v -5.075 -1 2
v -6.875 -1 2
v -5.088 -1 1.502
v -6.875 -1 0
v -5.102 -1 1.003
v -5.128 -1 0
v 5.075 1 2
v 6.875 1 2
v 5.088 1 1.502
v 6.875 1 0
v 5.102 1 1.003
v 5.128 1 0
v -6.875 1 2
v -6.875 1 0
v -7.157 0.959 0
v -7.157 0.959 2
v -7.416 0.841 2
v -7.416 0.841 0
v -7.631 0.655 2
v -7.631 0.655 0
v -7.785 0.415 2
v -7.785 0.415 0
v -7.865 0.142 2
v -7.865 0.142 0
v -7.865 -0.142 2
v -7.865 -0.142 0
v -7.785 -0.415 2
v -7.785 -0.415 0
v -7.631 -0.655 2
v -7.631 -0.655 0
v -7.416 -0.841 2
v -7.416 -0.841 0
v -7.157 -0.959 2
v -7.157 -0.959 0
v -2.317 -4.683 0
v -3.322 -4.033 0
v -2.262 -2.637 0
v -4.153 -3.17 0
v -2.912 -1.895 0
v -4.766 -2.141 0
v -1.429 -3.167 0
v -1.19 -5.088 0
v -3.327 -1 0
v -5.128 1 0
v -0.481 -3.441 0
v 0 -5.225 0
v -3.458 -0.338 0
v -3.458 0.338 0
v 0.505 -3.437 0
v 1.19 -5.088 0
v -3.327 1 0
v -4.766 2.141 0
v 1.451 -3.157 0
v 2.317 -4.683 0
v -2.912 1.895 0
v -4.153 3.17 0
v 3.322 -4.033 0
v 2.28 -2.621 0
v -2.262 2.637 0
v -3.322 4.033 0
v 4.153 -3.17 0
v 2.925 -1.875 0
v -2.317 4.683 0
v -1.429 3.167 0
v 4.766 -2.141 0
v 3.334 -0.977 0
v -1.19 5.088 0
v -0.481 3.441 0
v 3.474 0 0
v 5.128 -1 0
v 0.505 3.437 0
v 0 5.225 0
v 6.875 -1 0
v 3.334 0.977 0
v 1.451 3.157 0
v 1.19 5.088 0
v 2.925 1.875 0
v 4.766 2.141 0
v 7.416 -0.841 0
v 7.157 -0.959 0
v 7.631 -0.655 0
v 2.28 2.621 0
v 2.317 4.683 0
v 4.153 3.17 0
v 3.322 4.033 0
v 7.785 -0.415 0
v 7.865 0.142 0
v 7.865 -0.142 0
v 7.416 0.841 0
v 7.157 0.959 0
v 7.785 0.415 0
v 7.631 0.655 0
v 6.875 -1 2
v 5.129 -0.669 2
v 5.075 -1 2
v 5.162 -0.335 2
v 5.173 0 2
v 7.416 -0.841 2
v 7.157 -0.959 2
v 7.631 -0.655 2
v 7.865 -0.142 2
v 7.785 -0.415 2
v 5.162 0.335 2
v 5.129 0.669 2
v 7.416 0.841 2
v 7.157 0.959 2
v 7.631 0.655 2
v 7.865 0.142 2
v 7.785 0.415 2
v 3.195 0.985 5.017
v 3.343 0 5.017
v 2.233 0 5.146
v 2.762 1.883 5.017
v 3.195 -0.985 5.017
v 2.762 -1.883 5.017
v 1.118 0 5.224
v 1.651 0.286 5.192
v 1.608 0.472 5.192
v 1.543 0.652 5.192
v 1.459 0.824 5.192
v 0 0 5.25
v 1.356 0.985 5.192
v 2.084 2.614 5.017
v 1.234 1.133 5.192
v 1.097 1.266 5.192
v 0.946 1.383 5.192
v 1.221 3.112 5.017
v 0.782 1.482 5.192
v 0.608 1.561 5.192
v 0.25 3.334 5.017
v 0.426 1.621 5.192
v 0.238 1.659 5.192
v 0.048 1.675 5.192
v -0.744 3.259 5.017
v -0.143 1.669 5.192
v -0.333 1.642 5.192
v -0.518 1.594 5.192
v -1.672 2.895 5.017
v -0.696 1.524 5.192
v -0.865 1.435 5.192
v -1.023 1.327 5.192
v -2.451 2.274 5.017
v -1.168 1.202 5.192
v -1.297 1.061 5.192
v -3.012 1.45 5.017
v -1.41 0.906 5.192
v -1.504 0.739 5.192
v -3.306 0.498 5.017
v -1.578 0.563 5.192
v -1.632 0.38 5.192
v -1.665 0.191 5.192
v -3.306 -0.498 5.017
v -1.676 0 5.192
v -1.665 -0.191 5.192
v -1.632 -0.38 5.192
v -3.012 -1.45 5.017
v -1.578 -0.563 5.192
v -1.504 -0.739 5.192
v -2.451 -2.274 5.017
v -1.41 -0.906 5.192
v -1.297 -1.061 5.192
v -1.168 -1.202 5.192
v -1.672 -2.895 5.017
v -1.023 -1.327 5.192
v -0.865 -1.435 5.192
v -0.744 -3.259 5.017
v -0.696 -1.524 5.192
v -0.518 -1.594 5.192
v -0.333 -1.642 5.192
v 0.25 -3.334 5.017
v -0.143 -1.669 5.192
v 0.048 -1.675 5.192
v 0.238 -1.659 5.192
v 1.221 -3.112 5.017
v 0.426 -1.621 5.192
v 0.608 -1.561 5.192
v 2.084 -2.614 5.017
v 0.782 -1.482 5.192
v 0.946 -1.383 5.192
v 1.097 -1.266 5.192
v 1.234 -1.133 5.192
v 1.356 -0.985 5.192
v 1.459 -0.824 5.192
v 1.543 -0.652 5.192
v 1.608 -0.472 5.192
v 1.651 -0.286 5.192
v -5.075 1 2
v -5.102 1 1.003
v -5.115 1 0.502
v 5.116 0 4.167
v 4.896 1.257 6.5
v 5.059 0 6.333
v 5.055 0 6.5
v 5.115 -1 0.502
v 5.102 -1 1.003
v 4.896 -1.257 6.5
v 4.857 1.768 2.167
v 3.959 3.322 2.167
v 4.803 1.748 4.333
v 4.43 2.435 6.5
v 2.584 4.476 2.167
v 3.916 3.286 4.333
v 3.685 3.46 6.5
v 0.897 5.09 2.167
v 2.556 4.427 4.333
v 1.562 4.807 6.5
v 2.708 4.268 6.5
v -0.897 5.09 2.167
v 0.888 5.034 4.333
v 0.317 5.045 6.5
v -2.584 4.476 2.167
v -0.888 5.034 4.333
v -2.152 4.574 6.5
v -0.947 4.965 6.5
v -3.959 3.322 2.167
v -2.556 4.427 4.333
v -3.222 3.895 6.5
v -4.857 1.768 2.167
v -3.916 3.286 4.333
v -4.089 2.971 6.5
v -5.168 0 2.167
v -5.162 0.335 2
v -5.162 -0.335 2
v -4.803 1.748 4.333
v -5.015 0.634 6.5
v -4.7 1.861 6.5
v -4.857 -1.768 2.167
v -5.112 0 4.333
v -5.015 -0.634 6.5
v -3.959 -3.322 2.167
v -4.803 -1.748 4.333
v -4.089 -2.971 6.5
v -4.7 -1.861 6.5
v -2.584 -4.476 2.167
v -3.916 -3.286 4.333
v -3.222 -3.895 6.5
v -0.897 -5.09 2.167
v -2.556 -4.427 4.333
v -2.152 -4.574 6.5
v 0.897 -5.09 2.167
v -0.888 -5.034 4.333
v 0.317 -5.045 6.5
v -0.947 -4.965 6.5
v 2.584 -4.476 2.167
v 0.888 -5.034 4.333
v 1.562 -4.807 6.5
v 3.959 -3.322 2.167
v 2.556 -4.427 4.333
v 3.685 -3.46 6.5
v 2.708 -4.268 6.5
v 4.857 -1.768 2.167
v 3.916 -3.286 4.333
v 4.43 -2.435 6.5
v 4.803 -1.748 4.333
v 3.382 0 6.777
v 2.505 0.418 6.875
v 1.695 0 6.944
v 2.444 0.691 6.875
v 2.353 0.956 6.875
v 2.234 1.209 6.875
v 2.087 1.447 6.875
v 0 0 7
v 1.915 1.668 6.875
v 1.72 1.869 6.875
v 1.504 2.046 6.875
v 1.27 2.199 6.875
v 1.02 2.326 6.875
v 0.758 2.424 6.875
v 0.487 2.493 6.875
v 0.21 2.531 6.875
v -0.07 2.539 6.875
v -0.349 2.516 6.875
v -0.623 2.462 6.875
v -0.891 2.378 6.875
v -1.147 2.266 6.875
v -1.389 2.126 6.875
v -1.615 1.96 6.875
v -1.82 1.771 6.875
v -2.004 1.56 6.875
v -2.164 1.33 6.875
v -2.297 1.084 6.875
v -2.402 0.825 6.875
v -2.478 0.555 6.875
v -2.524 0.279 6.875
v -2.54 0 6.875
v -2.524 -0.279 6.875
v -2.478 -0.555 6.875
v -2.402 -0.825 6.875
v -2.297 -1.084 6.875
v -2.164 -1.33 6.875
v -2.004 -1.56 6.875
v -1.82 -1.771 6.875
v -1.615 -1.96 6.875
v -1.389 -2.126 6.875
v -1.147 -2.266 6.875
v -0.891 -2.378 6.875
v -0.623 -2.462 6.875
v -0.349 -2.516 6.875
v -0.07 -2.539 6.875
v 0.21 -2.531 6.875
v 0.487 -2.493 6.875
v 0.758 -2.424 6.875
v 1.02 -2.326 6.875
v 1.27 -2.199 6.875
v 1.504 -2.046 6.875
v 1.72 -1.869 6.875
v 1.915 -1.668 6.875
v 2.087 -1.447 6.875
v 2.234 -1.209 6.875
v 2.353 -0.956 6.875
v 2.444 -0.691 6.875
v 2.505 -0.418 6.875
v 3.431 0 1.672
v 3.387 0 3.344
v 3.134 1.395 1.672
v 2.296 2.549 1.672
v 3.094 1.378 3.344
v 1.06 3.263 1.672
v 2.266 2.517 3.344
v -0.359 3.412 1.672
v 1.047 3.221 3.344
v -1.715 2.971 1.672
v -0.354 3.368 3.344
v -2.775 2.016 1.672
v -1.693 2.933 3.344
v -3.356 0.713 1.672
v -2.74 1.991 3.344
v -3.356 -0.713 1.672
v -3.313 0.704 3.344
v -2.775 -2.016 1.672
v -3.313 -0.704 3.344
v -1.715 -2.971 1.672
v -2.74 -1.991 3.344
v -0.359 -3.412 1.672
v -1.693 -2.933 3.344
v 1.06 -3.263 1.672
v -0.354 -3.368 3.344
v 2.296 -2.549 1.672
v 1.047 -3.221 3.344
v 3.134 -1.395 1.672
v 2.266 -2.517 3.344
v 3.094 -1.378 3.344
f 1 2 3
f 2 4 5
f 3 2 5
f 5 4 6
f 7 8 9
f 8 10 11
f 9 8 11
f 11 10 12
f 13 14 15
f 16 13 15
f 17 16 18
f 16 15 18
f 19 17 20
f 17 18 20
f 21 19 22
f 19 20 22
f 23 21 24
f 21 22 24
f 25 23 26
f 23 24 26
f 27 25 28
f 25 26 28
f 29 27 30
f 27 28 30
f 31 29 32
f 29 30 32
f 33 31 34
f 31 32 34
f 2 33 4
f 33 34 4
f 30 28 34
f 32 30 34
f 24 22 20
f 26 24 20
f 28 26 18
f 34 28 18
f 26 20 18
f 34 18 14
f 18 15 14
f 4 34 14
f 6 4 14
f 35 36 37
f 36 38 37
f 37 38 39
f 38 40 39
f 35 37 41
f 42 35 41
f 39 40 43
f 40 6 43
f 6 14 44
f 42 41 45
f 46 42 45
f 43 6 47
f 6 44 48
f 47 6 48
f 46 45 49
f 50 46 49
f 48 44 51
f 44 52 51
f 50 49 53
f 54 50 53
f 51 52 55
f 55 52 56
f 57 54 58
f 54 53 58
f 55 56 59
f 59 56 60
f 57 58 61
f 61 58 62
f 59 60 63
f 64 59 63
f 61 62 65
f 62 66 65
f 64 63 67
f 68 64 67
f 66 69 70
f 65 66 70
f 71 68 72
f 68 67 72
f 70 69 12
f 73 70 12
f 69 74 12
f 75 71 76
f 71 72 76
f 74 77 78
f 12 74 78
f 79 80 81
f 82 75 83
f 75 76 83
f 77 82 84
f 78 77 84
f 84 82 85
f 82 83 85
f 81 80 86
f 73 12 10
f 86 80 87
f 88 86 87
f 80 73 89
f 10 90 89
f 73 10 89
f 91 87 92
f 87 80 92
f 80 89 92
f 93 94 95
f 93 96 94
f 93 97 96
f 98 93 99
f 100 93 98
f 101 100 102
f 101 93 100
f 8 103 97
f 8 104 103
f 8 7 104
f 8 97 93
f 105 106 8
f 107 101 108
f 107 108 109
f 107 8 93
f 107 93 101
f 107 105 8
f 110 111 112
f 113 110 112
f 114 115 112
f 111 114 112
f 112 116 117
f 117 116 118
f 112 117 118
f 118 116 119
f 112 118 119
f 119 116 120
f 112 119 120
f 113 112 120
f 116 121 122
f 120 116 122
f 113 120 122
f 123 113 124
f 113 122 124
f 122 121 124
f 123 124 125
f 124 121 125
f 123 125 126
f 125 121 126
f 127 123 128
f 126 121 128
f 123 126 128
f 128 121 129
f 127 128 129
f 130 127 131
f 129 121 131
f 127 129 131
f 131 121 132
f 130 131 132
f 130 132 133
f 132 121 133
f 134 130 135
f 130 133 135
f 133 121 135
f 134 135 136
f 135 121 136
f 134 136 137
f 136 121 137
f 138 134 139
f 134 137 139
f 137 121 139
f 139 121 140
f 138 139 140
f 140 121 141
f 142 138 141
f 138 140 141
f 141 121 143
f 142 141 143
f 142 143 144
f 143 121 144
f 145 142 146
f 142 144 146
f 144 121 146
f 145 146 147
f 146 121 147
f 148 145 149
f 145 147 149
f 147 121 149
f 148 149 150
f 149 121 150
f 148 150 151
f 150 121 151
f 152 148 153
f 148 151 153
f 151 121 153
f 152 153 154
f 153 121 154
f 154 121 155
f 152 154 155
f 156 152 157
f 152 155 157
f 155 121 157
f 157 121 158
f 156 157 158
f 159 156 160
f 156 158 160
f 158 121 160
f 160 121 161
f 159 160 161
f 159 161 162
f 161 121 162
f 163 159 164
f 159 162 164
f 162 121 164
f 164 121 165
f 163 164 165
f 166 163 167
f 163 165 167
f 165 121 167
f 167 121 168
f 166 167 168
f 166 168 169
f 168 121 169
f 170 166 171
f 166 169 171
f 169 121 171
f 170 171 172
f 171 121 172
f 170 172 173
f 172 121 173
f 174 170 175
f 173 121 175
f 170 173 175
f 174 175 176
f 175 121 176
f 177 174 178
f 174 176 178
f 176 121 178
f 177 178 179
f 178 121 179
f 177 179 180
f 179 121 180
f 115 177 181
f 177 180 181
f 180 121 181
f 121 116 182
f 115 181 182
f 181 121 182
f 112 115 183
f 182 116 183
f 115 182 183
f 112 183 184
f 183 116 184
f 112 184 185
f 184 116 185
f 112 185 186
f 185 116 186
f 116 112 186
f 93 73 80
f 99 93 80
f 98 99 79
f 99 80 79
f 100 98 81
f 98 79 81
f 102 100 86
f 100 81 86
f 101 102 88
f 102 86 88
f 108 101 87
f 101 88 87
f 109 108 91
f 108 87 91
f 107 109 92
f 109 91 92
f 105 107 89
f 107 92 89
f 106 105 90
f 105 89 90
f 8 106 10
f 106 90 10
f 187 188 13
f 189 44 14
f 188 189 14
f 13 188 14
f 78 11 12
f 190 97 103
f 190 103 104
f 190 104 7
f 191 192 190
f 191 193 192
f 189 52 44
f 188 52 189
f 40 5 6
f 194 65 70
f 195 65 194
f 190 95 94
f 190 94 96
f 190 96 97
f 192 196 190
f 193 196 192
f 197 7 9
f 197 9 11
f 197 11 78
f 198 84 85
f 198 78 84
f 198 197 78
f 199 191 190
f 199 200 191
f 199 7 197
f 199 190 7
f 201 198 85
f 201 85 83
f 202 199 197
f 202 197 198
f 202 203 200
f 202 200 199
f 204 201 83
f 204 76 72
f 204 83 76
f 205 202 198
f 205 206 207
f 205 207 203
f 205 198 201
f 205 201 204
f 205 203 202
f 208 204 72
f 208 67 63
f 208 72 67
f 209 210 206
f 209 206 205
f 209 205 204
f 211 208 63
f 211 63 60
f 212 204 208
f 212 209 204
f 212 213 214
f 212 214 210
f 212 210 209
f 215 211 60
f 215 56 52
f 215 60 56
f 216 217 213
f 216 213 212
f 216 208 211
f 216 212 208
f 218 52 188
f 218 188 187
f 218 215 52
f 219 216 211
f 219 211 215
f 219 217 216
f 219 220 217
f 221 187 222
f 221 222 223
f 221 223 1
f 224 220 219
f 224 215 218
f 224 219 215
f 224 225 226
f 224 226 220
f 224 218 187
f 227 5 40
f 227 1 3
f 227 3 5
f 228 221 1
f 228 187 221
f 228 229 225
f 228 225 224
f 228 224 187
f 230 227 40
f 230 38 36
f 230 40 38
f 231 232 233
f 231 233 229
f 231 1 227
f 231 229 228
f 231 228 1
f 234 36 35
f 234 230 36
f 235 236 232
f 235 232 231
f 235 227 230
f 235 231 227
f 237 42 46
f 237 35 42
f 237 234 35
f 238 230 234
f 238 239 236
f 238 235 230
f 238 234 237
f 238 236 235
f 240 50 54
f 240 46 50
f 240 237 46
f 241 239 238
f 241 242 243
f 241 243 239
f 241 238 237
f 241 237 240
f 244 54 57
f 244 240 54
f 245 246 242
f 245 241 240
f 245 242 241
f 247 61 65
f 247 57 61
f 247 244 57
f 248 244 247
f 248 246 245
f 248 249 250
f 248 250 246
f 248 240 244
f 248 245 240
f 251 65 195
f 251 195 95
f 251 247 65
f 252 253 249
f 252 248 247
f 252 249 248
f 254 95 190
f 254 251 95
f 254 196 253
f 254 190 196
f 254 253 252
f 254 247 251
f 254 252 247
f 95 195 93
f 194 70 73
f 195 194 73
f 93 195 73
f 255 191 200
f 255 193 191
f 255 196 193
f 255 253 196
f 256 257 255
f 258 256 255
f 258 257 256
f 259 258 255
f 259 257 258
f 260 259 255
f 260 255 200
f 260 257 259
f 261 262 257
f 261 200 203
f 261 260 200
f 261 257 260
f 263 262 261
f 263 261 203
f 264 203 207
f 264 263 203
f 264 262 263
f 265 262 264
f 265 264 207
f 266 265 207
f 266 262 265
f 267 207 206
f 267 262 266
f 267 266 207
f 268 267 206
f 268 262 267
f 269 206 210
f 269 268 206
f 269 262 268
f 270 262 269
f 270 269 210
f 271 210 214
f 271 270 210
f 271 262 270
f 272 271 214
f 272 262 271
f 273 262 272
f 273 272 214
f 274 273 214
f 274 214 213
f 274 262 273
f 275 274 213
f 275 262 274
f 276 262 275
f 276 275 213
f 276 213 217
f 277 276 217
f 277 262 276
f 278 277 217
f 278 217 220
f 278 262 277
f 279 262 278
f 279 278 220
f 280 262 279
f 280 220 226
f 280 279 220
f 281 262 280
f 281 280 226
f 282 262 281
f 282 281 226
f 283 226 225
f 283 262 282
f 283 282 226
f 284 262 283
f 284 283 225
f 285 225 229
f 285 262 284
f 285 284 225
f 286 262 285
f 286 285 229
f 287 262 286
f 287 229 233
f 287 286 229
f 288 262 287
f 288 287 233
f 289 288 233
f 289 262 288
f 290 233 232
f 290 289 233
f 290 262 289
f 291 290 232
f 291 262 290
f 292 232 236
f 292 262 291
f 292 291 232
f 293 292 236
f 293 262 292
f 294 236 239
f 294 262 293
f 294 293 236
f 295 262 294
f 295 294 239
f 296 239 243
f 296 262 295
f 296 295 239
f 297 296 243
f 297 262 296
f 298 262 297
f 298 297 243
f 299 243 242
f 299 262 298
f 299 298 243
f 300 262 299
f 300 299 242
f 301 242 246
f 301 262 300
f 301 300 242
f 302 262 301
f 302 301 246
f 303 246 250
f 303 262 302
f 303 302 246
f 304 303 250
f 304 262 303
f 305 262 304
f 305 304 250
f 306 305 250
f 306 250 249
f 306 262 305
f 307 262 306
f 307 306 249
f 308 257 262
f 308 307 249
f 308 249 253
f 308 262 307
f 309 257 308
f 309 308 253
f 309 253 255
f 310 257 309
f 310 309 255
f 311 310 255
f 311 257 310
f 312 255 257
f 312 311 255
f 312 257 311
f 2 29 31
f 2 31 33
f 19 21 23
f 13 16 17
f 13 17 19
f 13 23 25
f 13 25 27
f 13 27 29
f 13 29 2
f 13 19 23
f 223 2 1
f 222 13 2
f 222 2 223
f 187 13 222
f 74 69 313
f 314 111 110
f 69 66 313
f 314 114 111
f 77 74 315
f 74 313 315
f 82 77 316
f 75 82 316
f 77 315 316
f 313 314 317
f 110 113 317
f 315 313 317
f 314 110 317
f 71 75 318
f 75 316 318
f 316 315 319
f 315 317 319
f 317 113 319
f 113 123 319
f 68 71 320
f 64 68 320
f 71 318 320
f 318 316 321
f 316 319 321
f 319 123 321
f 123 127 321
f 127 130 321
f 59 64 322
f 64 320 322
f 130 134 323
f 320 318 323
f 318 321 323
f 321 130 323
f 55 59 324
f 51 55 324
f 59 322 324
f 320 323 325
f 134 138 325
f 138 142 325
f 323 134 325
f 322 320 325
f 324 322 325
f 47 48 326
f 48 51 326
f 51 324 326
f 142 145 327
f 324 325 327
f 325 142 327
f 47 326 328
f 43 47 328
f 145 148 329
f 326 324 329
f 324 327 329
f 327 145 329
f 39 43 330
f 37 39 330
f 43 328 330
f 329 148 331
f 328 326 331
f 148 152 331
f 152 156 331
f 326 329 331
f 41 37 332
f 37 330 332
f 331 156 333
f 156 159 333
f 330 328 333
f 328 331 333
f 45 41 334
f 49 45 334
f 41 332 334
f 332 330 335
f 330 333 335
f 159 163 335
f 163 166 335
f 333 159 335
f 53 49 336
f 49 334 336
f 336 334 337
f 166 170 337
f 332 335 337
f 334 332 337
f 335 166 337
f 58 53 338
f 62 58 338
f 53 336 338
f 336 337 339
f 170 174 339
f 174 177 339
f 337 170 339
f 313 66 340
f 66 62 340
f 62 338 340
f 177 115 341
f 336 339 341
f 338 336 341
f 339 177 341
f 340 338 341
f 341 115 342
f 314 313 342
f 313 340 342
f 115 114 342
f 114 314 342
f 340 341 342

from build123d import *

# Parameters (mm, degrees)
SKETCH1_R           = 5.225
BOSS_EXTRUDE1_DEPTH = 6.5
BOSS_EXTRUDE1_TAPER = 1.5
DOME1_FACE_RADIUS   = 5.05479151
DOME1_HEIGHT        = 0.5
BOSS_EXTRUDE2_DEPTH = 2


# Read off the part's stored shape, not the designer's step: Shell1
with BuildPart() as part:
    # Sketch1 → Boss-Extrude1 (new body)
    with BuildSketch(Plane.XY):
        Circle(SKETCH1_R)
    extrude(amount=BOSS_EXTRUDE1_DEPTH, taper=BOSS_EXTRUDE1_TAPER)

    # Dome1: a dome of height H over a round flat face of radius A is a cap of a sphere of radius (A * A + H * H) / (2 * H)
    dome1_r = (DOME1_FACE_RADIUS * DOME1_FACE_RADIUS + DOME1_HEIGHT * DOME1_HEIGHT) / (2 * DOME1_HEIGHT)
    dome1_base = Plane((0, 0, 6.5), z_dir=(0, 0, 1))
    with Locations(dome1_base.offset(DOME1_HEIGHT - dome1_r)):
        dome1_ball = Sphere(dome1_r, mode=Mode.PRIVATE)
    add(split(dome1_ball, bisect_by=dome1_base, keep=Keep.TOP, mode=Mode.PRIVATE))

    # Shell1 outline → Shell1 (revolve, cut)
    with BuildSketch(Plane.XZ):
        with BuildLine():
            Line((3.474400113, 0), (3.343037716, 5.016528444))
            ThreePointArc((3.343037716, 5.016528444), (1.675590205, 5.191561114), (0, 5.25))
            Line((0, 5.25), (0, 0))
            Line((0, 0), (3.474400113, 0))
        make_face()
    revolve(axis=Axis((0, 0, 0), (0, 0, 1)), mode=Mode.SUBTRACT)

    # Sketch3 → Boss-Extrude2 (add)
    with BuildSketch(Plane(origin=(0, 0, 0), x_dir=(-1, 0, 0), z_dir=(0, 0, -1))):
        with BuildLine():
            Line((-6.875, 1), (-3.327379772, 1))
            ThreePointArc((-3.327379772, 1), (-3.474400113, 0), (-3.327379772, -1))
            Line((-3.327379772, -1), (-6.875, -1))
            ThreePointArc((-6.875, -1), (-7.875, 0), (-6.875, 1))
        make_face()
        with BuildLine():
            Line((3.327379772, 1), (6.875, 1))
            ThreePointArc((6.875, 1), (7.875, 0), (6.875, -1))
            Line((6.875, -1), (3.327379772, -1))
            ThreePointArc((3.327379772, -1), (3.474400113, 0), (3.327379772, 1))
        make_face()
    extrude(amount=-BOSS_EXTRUDE2_DEPTH)


solid = part.part
